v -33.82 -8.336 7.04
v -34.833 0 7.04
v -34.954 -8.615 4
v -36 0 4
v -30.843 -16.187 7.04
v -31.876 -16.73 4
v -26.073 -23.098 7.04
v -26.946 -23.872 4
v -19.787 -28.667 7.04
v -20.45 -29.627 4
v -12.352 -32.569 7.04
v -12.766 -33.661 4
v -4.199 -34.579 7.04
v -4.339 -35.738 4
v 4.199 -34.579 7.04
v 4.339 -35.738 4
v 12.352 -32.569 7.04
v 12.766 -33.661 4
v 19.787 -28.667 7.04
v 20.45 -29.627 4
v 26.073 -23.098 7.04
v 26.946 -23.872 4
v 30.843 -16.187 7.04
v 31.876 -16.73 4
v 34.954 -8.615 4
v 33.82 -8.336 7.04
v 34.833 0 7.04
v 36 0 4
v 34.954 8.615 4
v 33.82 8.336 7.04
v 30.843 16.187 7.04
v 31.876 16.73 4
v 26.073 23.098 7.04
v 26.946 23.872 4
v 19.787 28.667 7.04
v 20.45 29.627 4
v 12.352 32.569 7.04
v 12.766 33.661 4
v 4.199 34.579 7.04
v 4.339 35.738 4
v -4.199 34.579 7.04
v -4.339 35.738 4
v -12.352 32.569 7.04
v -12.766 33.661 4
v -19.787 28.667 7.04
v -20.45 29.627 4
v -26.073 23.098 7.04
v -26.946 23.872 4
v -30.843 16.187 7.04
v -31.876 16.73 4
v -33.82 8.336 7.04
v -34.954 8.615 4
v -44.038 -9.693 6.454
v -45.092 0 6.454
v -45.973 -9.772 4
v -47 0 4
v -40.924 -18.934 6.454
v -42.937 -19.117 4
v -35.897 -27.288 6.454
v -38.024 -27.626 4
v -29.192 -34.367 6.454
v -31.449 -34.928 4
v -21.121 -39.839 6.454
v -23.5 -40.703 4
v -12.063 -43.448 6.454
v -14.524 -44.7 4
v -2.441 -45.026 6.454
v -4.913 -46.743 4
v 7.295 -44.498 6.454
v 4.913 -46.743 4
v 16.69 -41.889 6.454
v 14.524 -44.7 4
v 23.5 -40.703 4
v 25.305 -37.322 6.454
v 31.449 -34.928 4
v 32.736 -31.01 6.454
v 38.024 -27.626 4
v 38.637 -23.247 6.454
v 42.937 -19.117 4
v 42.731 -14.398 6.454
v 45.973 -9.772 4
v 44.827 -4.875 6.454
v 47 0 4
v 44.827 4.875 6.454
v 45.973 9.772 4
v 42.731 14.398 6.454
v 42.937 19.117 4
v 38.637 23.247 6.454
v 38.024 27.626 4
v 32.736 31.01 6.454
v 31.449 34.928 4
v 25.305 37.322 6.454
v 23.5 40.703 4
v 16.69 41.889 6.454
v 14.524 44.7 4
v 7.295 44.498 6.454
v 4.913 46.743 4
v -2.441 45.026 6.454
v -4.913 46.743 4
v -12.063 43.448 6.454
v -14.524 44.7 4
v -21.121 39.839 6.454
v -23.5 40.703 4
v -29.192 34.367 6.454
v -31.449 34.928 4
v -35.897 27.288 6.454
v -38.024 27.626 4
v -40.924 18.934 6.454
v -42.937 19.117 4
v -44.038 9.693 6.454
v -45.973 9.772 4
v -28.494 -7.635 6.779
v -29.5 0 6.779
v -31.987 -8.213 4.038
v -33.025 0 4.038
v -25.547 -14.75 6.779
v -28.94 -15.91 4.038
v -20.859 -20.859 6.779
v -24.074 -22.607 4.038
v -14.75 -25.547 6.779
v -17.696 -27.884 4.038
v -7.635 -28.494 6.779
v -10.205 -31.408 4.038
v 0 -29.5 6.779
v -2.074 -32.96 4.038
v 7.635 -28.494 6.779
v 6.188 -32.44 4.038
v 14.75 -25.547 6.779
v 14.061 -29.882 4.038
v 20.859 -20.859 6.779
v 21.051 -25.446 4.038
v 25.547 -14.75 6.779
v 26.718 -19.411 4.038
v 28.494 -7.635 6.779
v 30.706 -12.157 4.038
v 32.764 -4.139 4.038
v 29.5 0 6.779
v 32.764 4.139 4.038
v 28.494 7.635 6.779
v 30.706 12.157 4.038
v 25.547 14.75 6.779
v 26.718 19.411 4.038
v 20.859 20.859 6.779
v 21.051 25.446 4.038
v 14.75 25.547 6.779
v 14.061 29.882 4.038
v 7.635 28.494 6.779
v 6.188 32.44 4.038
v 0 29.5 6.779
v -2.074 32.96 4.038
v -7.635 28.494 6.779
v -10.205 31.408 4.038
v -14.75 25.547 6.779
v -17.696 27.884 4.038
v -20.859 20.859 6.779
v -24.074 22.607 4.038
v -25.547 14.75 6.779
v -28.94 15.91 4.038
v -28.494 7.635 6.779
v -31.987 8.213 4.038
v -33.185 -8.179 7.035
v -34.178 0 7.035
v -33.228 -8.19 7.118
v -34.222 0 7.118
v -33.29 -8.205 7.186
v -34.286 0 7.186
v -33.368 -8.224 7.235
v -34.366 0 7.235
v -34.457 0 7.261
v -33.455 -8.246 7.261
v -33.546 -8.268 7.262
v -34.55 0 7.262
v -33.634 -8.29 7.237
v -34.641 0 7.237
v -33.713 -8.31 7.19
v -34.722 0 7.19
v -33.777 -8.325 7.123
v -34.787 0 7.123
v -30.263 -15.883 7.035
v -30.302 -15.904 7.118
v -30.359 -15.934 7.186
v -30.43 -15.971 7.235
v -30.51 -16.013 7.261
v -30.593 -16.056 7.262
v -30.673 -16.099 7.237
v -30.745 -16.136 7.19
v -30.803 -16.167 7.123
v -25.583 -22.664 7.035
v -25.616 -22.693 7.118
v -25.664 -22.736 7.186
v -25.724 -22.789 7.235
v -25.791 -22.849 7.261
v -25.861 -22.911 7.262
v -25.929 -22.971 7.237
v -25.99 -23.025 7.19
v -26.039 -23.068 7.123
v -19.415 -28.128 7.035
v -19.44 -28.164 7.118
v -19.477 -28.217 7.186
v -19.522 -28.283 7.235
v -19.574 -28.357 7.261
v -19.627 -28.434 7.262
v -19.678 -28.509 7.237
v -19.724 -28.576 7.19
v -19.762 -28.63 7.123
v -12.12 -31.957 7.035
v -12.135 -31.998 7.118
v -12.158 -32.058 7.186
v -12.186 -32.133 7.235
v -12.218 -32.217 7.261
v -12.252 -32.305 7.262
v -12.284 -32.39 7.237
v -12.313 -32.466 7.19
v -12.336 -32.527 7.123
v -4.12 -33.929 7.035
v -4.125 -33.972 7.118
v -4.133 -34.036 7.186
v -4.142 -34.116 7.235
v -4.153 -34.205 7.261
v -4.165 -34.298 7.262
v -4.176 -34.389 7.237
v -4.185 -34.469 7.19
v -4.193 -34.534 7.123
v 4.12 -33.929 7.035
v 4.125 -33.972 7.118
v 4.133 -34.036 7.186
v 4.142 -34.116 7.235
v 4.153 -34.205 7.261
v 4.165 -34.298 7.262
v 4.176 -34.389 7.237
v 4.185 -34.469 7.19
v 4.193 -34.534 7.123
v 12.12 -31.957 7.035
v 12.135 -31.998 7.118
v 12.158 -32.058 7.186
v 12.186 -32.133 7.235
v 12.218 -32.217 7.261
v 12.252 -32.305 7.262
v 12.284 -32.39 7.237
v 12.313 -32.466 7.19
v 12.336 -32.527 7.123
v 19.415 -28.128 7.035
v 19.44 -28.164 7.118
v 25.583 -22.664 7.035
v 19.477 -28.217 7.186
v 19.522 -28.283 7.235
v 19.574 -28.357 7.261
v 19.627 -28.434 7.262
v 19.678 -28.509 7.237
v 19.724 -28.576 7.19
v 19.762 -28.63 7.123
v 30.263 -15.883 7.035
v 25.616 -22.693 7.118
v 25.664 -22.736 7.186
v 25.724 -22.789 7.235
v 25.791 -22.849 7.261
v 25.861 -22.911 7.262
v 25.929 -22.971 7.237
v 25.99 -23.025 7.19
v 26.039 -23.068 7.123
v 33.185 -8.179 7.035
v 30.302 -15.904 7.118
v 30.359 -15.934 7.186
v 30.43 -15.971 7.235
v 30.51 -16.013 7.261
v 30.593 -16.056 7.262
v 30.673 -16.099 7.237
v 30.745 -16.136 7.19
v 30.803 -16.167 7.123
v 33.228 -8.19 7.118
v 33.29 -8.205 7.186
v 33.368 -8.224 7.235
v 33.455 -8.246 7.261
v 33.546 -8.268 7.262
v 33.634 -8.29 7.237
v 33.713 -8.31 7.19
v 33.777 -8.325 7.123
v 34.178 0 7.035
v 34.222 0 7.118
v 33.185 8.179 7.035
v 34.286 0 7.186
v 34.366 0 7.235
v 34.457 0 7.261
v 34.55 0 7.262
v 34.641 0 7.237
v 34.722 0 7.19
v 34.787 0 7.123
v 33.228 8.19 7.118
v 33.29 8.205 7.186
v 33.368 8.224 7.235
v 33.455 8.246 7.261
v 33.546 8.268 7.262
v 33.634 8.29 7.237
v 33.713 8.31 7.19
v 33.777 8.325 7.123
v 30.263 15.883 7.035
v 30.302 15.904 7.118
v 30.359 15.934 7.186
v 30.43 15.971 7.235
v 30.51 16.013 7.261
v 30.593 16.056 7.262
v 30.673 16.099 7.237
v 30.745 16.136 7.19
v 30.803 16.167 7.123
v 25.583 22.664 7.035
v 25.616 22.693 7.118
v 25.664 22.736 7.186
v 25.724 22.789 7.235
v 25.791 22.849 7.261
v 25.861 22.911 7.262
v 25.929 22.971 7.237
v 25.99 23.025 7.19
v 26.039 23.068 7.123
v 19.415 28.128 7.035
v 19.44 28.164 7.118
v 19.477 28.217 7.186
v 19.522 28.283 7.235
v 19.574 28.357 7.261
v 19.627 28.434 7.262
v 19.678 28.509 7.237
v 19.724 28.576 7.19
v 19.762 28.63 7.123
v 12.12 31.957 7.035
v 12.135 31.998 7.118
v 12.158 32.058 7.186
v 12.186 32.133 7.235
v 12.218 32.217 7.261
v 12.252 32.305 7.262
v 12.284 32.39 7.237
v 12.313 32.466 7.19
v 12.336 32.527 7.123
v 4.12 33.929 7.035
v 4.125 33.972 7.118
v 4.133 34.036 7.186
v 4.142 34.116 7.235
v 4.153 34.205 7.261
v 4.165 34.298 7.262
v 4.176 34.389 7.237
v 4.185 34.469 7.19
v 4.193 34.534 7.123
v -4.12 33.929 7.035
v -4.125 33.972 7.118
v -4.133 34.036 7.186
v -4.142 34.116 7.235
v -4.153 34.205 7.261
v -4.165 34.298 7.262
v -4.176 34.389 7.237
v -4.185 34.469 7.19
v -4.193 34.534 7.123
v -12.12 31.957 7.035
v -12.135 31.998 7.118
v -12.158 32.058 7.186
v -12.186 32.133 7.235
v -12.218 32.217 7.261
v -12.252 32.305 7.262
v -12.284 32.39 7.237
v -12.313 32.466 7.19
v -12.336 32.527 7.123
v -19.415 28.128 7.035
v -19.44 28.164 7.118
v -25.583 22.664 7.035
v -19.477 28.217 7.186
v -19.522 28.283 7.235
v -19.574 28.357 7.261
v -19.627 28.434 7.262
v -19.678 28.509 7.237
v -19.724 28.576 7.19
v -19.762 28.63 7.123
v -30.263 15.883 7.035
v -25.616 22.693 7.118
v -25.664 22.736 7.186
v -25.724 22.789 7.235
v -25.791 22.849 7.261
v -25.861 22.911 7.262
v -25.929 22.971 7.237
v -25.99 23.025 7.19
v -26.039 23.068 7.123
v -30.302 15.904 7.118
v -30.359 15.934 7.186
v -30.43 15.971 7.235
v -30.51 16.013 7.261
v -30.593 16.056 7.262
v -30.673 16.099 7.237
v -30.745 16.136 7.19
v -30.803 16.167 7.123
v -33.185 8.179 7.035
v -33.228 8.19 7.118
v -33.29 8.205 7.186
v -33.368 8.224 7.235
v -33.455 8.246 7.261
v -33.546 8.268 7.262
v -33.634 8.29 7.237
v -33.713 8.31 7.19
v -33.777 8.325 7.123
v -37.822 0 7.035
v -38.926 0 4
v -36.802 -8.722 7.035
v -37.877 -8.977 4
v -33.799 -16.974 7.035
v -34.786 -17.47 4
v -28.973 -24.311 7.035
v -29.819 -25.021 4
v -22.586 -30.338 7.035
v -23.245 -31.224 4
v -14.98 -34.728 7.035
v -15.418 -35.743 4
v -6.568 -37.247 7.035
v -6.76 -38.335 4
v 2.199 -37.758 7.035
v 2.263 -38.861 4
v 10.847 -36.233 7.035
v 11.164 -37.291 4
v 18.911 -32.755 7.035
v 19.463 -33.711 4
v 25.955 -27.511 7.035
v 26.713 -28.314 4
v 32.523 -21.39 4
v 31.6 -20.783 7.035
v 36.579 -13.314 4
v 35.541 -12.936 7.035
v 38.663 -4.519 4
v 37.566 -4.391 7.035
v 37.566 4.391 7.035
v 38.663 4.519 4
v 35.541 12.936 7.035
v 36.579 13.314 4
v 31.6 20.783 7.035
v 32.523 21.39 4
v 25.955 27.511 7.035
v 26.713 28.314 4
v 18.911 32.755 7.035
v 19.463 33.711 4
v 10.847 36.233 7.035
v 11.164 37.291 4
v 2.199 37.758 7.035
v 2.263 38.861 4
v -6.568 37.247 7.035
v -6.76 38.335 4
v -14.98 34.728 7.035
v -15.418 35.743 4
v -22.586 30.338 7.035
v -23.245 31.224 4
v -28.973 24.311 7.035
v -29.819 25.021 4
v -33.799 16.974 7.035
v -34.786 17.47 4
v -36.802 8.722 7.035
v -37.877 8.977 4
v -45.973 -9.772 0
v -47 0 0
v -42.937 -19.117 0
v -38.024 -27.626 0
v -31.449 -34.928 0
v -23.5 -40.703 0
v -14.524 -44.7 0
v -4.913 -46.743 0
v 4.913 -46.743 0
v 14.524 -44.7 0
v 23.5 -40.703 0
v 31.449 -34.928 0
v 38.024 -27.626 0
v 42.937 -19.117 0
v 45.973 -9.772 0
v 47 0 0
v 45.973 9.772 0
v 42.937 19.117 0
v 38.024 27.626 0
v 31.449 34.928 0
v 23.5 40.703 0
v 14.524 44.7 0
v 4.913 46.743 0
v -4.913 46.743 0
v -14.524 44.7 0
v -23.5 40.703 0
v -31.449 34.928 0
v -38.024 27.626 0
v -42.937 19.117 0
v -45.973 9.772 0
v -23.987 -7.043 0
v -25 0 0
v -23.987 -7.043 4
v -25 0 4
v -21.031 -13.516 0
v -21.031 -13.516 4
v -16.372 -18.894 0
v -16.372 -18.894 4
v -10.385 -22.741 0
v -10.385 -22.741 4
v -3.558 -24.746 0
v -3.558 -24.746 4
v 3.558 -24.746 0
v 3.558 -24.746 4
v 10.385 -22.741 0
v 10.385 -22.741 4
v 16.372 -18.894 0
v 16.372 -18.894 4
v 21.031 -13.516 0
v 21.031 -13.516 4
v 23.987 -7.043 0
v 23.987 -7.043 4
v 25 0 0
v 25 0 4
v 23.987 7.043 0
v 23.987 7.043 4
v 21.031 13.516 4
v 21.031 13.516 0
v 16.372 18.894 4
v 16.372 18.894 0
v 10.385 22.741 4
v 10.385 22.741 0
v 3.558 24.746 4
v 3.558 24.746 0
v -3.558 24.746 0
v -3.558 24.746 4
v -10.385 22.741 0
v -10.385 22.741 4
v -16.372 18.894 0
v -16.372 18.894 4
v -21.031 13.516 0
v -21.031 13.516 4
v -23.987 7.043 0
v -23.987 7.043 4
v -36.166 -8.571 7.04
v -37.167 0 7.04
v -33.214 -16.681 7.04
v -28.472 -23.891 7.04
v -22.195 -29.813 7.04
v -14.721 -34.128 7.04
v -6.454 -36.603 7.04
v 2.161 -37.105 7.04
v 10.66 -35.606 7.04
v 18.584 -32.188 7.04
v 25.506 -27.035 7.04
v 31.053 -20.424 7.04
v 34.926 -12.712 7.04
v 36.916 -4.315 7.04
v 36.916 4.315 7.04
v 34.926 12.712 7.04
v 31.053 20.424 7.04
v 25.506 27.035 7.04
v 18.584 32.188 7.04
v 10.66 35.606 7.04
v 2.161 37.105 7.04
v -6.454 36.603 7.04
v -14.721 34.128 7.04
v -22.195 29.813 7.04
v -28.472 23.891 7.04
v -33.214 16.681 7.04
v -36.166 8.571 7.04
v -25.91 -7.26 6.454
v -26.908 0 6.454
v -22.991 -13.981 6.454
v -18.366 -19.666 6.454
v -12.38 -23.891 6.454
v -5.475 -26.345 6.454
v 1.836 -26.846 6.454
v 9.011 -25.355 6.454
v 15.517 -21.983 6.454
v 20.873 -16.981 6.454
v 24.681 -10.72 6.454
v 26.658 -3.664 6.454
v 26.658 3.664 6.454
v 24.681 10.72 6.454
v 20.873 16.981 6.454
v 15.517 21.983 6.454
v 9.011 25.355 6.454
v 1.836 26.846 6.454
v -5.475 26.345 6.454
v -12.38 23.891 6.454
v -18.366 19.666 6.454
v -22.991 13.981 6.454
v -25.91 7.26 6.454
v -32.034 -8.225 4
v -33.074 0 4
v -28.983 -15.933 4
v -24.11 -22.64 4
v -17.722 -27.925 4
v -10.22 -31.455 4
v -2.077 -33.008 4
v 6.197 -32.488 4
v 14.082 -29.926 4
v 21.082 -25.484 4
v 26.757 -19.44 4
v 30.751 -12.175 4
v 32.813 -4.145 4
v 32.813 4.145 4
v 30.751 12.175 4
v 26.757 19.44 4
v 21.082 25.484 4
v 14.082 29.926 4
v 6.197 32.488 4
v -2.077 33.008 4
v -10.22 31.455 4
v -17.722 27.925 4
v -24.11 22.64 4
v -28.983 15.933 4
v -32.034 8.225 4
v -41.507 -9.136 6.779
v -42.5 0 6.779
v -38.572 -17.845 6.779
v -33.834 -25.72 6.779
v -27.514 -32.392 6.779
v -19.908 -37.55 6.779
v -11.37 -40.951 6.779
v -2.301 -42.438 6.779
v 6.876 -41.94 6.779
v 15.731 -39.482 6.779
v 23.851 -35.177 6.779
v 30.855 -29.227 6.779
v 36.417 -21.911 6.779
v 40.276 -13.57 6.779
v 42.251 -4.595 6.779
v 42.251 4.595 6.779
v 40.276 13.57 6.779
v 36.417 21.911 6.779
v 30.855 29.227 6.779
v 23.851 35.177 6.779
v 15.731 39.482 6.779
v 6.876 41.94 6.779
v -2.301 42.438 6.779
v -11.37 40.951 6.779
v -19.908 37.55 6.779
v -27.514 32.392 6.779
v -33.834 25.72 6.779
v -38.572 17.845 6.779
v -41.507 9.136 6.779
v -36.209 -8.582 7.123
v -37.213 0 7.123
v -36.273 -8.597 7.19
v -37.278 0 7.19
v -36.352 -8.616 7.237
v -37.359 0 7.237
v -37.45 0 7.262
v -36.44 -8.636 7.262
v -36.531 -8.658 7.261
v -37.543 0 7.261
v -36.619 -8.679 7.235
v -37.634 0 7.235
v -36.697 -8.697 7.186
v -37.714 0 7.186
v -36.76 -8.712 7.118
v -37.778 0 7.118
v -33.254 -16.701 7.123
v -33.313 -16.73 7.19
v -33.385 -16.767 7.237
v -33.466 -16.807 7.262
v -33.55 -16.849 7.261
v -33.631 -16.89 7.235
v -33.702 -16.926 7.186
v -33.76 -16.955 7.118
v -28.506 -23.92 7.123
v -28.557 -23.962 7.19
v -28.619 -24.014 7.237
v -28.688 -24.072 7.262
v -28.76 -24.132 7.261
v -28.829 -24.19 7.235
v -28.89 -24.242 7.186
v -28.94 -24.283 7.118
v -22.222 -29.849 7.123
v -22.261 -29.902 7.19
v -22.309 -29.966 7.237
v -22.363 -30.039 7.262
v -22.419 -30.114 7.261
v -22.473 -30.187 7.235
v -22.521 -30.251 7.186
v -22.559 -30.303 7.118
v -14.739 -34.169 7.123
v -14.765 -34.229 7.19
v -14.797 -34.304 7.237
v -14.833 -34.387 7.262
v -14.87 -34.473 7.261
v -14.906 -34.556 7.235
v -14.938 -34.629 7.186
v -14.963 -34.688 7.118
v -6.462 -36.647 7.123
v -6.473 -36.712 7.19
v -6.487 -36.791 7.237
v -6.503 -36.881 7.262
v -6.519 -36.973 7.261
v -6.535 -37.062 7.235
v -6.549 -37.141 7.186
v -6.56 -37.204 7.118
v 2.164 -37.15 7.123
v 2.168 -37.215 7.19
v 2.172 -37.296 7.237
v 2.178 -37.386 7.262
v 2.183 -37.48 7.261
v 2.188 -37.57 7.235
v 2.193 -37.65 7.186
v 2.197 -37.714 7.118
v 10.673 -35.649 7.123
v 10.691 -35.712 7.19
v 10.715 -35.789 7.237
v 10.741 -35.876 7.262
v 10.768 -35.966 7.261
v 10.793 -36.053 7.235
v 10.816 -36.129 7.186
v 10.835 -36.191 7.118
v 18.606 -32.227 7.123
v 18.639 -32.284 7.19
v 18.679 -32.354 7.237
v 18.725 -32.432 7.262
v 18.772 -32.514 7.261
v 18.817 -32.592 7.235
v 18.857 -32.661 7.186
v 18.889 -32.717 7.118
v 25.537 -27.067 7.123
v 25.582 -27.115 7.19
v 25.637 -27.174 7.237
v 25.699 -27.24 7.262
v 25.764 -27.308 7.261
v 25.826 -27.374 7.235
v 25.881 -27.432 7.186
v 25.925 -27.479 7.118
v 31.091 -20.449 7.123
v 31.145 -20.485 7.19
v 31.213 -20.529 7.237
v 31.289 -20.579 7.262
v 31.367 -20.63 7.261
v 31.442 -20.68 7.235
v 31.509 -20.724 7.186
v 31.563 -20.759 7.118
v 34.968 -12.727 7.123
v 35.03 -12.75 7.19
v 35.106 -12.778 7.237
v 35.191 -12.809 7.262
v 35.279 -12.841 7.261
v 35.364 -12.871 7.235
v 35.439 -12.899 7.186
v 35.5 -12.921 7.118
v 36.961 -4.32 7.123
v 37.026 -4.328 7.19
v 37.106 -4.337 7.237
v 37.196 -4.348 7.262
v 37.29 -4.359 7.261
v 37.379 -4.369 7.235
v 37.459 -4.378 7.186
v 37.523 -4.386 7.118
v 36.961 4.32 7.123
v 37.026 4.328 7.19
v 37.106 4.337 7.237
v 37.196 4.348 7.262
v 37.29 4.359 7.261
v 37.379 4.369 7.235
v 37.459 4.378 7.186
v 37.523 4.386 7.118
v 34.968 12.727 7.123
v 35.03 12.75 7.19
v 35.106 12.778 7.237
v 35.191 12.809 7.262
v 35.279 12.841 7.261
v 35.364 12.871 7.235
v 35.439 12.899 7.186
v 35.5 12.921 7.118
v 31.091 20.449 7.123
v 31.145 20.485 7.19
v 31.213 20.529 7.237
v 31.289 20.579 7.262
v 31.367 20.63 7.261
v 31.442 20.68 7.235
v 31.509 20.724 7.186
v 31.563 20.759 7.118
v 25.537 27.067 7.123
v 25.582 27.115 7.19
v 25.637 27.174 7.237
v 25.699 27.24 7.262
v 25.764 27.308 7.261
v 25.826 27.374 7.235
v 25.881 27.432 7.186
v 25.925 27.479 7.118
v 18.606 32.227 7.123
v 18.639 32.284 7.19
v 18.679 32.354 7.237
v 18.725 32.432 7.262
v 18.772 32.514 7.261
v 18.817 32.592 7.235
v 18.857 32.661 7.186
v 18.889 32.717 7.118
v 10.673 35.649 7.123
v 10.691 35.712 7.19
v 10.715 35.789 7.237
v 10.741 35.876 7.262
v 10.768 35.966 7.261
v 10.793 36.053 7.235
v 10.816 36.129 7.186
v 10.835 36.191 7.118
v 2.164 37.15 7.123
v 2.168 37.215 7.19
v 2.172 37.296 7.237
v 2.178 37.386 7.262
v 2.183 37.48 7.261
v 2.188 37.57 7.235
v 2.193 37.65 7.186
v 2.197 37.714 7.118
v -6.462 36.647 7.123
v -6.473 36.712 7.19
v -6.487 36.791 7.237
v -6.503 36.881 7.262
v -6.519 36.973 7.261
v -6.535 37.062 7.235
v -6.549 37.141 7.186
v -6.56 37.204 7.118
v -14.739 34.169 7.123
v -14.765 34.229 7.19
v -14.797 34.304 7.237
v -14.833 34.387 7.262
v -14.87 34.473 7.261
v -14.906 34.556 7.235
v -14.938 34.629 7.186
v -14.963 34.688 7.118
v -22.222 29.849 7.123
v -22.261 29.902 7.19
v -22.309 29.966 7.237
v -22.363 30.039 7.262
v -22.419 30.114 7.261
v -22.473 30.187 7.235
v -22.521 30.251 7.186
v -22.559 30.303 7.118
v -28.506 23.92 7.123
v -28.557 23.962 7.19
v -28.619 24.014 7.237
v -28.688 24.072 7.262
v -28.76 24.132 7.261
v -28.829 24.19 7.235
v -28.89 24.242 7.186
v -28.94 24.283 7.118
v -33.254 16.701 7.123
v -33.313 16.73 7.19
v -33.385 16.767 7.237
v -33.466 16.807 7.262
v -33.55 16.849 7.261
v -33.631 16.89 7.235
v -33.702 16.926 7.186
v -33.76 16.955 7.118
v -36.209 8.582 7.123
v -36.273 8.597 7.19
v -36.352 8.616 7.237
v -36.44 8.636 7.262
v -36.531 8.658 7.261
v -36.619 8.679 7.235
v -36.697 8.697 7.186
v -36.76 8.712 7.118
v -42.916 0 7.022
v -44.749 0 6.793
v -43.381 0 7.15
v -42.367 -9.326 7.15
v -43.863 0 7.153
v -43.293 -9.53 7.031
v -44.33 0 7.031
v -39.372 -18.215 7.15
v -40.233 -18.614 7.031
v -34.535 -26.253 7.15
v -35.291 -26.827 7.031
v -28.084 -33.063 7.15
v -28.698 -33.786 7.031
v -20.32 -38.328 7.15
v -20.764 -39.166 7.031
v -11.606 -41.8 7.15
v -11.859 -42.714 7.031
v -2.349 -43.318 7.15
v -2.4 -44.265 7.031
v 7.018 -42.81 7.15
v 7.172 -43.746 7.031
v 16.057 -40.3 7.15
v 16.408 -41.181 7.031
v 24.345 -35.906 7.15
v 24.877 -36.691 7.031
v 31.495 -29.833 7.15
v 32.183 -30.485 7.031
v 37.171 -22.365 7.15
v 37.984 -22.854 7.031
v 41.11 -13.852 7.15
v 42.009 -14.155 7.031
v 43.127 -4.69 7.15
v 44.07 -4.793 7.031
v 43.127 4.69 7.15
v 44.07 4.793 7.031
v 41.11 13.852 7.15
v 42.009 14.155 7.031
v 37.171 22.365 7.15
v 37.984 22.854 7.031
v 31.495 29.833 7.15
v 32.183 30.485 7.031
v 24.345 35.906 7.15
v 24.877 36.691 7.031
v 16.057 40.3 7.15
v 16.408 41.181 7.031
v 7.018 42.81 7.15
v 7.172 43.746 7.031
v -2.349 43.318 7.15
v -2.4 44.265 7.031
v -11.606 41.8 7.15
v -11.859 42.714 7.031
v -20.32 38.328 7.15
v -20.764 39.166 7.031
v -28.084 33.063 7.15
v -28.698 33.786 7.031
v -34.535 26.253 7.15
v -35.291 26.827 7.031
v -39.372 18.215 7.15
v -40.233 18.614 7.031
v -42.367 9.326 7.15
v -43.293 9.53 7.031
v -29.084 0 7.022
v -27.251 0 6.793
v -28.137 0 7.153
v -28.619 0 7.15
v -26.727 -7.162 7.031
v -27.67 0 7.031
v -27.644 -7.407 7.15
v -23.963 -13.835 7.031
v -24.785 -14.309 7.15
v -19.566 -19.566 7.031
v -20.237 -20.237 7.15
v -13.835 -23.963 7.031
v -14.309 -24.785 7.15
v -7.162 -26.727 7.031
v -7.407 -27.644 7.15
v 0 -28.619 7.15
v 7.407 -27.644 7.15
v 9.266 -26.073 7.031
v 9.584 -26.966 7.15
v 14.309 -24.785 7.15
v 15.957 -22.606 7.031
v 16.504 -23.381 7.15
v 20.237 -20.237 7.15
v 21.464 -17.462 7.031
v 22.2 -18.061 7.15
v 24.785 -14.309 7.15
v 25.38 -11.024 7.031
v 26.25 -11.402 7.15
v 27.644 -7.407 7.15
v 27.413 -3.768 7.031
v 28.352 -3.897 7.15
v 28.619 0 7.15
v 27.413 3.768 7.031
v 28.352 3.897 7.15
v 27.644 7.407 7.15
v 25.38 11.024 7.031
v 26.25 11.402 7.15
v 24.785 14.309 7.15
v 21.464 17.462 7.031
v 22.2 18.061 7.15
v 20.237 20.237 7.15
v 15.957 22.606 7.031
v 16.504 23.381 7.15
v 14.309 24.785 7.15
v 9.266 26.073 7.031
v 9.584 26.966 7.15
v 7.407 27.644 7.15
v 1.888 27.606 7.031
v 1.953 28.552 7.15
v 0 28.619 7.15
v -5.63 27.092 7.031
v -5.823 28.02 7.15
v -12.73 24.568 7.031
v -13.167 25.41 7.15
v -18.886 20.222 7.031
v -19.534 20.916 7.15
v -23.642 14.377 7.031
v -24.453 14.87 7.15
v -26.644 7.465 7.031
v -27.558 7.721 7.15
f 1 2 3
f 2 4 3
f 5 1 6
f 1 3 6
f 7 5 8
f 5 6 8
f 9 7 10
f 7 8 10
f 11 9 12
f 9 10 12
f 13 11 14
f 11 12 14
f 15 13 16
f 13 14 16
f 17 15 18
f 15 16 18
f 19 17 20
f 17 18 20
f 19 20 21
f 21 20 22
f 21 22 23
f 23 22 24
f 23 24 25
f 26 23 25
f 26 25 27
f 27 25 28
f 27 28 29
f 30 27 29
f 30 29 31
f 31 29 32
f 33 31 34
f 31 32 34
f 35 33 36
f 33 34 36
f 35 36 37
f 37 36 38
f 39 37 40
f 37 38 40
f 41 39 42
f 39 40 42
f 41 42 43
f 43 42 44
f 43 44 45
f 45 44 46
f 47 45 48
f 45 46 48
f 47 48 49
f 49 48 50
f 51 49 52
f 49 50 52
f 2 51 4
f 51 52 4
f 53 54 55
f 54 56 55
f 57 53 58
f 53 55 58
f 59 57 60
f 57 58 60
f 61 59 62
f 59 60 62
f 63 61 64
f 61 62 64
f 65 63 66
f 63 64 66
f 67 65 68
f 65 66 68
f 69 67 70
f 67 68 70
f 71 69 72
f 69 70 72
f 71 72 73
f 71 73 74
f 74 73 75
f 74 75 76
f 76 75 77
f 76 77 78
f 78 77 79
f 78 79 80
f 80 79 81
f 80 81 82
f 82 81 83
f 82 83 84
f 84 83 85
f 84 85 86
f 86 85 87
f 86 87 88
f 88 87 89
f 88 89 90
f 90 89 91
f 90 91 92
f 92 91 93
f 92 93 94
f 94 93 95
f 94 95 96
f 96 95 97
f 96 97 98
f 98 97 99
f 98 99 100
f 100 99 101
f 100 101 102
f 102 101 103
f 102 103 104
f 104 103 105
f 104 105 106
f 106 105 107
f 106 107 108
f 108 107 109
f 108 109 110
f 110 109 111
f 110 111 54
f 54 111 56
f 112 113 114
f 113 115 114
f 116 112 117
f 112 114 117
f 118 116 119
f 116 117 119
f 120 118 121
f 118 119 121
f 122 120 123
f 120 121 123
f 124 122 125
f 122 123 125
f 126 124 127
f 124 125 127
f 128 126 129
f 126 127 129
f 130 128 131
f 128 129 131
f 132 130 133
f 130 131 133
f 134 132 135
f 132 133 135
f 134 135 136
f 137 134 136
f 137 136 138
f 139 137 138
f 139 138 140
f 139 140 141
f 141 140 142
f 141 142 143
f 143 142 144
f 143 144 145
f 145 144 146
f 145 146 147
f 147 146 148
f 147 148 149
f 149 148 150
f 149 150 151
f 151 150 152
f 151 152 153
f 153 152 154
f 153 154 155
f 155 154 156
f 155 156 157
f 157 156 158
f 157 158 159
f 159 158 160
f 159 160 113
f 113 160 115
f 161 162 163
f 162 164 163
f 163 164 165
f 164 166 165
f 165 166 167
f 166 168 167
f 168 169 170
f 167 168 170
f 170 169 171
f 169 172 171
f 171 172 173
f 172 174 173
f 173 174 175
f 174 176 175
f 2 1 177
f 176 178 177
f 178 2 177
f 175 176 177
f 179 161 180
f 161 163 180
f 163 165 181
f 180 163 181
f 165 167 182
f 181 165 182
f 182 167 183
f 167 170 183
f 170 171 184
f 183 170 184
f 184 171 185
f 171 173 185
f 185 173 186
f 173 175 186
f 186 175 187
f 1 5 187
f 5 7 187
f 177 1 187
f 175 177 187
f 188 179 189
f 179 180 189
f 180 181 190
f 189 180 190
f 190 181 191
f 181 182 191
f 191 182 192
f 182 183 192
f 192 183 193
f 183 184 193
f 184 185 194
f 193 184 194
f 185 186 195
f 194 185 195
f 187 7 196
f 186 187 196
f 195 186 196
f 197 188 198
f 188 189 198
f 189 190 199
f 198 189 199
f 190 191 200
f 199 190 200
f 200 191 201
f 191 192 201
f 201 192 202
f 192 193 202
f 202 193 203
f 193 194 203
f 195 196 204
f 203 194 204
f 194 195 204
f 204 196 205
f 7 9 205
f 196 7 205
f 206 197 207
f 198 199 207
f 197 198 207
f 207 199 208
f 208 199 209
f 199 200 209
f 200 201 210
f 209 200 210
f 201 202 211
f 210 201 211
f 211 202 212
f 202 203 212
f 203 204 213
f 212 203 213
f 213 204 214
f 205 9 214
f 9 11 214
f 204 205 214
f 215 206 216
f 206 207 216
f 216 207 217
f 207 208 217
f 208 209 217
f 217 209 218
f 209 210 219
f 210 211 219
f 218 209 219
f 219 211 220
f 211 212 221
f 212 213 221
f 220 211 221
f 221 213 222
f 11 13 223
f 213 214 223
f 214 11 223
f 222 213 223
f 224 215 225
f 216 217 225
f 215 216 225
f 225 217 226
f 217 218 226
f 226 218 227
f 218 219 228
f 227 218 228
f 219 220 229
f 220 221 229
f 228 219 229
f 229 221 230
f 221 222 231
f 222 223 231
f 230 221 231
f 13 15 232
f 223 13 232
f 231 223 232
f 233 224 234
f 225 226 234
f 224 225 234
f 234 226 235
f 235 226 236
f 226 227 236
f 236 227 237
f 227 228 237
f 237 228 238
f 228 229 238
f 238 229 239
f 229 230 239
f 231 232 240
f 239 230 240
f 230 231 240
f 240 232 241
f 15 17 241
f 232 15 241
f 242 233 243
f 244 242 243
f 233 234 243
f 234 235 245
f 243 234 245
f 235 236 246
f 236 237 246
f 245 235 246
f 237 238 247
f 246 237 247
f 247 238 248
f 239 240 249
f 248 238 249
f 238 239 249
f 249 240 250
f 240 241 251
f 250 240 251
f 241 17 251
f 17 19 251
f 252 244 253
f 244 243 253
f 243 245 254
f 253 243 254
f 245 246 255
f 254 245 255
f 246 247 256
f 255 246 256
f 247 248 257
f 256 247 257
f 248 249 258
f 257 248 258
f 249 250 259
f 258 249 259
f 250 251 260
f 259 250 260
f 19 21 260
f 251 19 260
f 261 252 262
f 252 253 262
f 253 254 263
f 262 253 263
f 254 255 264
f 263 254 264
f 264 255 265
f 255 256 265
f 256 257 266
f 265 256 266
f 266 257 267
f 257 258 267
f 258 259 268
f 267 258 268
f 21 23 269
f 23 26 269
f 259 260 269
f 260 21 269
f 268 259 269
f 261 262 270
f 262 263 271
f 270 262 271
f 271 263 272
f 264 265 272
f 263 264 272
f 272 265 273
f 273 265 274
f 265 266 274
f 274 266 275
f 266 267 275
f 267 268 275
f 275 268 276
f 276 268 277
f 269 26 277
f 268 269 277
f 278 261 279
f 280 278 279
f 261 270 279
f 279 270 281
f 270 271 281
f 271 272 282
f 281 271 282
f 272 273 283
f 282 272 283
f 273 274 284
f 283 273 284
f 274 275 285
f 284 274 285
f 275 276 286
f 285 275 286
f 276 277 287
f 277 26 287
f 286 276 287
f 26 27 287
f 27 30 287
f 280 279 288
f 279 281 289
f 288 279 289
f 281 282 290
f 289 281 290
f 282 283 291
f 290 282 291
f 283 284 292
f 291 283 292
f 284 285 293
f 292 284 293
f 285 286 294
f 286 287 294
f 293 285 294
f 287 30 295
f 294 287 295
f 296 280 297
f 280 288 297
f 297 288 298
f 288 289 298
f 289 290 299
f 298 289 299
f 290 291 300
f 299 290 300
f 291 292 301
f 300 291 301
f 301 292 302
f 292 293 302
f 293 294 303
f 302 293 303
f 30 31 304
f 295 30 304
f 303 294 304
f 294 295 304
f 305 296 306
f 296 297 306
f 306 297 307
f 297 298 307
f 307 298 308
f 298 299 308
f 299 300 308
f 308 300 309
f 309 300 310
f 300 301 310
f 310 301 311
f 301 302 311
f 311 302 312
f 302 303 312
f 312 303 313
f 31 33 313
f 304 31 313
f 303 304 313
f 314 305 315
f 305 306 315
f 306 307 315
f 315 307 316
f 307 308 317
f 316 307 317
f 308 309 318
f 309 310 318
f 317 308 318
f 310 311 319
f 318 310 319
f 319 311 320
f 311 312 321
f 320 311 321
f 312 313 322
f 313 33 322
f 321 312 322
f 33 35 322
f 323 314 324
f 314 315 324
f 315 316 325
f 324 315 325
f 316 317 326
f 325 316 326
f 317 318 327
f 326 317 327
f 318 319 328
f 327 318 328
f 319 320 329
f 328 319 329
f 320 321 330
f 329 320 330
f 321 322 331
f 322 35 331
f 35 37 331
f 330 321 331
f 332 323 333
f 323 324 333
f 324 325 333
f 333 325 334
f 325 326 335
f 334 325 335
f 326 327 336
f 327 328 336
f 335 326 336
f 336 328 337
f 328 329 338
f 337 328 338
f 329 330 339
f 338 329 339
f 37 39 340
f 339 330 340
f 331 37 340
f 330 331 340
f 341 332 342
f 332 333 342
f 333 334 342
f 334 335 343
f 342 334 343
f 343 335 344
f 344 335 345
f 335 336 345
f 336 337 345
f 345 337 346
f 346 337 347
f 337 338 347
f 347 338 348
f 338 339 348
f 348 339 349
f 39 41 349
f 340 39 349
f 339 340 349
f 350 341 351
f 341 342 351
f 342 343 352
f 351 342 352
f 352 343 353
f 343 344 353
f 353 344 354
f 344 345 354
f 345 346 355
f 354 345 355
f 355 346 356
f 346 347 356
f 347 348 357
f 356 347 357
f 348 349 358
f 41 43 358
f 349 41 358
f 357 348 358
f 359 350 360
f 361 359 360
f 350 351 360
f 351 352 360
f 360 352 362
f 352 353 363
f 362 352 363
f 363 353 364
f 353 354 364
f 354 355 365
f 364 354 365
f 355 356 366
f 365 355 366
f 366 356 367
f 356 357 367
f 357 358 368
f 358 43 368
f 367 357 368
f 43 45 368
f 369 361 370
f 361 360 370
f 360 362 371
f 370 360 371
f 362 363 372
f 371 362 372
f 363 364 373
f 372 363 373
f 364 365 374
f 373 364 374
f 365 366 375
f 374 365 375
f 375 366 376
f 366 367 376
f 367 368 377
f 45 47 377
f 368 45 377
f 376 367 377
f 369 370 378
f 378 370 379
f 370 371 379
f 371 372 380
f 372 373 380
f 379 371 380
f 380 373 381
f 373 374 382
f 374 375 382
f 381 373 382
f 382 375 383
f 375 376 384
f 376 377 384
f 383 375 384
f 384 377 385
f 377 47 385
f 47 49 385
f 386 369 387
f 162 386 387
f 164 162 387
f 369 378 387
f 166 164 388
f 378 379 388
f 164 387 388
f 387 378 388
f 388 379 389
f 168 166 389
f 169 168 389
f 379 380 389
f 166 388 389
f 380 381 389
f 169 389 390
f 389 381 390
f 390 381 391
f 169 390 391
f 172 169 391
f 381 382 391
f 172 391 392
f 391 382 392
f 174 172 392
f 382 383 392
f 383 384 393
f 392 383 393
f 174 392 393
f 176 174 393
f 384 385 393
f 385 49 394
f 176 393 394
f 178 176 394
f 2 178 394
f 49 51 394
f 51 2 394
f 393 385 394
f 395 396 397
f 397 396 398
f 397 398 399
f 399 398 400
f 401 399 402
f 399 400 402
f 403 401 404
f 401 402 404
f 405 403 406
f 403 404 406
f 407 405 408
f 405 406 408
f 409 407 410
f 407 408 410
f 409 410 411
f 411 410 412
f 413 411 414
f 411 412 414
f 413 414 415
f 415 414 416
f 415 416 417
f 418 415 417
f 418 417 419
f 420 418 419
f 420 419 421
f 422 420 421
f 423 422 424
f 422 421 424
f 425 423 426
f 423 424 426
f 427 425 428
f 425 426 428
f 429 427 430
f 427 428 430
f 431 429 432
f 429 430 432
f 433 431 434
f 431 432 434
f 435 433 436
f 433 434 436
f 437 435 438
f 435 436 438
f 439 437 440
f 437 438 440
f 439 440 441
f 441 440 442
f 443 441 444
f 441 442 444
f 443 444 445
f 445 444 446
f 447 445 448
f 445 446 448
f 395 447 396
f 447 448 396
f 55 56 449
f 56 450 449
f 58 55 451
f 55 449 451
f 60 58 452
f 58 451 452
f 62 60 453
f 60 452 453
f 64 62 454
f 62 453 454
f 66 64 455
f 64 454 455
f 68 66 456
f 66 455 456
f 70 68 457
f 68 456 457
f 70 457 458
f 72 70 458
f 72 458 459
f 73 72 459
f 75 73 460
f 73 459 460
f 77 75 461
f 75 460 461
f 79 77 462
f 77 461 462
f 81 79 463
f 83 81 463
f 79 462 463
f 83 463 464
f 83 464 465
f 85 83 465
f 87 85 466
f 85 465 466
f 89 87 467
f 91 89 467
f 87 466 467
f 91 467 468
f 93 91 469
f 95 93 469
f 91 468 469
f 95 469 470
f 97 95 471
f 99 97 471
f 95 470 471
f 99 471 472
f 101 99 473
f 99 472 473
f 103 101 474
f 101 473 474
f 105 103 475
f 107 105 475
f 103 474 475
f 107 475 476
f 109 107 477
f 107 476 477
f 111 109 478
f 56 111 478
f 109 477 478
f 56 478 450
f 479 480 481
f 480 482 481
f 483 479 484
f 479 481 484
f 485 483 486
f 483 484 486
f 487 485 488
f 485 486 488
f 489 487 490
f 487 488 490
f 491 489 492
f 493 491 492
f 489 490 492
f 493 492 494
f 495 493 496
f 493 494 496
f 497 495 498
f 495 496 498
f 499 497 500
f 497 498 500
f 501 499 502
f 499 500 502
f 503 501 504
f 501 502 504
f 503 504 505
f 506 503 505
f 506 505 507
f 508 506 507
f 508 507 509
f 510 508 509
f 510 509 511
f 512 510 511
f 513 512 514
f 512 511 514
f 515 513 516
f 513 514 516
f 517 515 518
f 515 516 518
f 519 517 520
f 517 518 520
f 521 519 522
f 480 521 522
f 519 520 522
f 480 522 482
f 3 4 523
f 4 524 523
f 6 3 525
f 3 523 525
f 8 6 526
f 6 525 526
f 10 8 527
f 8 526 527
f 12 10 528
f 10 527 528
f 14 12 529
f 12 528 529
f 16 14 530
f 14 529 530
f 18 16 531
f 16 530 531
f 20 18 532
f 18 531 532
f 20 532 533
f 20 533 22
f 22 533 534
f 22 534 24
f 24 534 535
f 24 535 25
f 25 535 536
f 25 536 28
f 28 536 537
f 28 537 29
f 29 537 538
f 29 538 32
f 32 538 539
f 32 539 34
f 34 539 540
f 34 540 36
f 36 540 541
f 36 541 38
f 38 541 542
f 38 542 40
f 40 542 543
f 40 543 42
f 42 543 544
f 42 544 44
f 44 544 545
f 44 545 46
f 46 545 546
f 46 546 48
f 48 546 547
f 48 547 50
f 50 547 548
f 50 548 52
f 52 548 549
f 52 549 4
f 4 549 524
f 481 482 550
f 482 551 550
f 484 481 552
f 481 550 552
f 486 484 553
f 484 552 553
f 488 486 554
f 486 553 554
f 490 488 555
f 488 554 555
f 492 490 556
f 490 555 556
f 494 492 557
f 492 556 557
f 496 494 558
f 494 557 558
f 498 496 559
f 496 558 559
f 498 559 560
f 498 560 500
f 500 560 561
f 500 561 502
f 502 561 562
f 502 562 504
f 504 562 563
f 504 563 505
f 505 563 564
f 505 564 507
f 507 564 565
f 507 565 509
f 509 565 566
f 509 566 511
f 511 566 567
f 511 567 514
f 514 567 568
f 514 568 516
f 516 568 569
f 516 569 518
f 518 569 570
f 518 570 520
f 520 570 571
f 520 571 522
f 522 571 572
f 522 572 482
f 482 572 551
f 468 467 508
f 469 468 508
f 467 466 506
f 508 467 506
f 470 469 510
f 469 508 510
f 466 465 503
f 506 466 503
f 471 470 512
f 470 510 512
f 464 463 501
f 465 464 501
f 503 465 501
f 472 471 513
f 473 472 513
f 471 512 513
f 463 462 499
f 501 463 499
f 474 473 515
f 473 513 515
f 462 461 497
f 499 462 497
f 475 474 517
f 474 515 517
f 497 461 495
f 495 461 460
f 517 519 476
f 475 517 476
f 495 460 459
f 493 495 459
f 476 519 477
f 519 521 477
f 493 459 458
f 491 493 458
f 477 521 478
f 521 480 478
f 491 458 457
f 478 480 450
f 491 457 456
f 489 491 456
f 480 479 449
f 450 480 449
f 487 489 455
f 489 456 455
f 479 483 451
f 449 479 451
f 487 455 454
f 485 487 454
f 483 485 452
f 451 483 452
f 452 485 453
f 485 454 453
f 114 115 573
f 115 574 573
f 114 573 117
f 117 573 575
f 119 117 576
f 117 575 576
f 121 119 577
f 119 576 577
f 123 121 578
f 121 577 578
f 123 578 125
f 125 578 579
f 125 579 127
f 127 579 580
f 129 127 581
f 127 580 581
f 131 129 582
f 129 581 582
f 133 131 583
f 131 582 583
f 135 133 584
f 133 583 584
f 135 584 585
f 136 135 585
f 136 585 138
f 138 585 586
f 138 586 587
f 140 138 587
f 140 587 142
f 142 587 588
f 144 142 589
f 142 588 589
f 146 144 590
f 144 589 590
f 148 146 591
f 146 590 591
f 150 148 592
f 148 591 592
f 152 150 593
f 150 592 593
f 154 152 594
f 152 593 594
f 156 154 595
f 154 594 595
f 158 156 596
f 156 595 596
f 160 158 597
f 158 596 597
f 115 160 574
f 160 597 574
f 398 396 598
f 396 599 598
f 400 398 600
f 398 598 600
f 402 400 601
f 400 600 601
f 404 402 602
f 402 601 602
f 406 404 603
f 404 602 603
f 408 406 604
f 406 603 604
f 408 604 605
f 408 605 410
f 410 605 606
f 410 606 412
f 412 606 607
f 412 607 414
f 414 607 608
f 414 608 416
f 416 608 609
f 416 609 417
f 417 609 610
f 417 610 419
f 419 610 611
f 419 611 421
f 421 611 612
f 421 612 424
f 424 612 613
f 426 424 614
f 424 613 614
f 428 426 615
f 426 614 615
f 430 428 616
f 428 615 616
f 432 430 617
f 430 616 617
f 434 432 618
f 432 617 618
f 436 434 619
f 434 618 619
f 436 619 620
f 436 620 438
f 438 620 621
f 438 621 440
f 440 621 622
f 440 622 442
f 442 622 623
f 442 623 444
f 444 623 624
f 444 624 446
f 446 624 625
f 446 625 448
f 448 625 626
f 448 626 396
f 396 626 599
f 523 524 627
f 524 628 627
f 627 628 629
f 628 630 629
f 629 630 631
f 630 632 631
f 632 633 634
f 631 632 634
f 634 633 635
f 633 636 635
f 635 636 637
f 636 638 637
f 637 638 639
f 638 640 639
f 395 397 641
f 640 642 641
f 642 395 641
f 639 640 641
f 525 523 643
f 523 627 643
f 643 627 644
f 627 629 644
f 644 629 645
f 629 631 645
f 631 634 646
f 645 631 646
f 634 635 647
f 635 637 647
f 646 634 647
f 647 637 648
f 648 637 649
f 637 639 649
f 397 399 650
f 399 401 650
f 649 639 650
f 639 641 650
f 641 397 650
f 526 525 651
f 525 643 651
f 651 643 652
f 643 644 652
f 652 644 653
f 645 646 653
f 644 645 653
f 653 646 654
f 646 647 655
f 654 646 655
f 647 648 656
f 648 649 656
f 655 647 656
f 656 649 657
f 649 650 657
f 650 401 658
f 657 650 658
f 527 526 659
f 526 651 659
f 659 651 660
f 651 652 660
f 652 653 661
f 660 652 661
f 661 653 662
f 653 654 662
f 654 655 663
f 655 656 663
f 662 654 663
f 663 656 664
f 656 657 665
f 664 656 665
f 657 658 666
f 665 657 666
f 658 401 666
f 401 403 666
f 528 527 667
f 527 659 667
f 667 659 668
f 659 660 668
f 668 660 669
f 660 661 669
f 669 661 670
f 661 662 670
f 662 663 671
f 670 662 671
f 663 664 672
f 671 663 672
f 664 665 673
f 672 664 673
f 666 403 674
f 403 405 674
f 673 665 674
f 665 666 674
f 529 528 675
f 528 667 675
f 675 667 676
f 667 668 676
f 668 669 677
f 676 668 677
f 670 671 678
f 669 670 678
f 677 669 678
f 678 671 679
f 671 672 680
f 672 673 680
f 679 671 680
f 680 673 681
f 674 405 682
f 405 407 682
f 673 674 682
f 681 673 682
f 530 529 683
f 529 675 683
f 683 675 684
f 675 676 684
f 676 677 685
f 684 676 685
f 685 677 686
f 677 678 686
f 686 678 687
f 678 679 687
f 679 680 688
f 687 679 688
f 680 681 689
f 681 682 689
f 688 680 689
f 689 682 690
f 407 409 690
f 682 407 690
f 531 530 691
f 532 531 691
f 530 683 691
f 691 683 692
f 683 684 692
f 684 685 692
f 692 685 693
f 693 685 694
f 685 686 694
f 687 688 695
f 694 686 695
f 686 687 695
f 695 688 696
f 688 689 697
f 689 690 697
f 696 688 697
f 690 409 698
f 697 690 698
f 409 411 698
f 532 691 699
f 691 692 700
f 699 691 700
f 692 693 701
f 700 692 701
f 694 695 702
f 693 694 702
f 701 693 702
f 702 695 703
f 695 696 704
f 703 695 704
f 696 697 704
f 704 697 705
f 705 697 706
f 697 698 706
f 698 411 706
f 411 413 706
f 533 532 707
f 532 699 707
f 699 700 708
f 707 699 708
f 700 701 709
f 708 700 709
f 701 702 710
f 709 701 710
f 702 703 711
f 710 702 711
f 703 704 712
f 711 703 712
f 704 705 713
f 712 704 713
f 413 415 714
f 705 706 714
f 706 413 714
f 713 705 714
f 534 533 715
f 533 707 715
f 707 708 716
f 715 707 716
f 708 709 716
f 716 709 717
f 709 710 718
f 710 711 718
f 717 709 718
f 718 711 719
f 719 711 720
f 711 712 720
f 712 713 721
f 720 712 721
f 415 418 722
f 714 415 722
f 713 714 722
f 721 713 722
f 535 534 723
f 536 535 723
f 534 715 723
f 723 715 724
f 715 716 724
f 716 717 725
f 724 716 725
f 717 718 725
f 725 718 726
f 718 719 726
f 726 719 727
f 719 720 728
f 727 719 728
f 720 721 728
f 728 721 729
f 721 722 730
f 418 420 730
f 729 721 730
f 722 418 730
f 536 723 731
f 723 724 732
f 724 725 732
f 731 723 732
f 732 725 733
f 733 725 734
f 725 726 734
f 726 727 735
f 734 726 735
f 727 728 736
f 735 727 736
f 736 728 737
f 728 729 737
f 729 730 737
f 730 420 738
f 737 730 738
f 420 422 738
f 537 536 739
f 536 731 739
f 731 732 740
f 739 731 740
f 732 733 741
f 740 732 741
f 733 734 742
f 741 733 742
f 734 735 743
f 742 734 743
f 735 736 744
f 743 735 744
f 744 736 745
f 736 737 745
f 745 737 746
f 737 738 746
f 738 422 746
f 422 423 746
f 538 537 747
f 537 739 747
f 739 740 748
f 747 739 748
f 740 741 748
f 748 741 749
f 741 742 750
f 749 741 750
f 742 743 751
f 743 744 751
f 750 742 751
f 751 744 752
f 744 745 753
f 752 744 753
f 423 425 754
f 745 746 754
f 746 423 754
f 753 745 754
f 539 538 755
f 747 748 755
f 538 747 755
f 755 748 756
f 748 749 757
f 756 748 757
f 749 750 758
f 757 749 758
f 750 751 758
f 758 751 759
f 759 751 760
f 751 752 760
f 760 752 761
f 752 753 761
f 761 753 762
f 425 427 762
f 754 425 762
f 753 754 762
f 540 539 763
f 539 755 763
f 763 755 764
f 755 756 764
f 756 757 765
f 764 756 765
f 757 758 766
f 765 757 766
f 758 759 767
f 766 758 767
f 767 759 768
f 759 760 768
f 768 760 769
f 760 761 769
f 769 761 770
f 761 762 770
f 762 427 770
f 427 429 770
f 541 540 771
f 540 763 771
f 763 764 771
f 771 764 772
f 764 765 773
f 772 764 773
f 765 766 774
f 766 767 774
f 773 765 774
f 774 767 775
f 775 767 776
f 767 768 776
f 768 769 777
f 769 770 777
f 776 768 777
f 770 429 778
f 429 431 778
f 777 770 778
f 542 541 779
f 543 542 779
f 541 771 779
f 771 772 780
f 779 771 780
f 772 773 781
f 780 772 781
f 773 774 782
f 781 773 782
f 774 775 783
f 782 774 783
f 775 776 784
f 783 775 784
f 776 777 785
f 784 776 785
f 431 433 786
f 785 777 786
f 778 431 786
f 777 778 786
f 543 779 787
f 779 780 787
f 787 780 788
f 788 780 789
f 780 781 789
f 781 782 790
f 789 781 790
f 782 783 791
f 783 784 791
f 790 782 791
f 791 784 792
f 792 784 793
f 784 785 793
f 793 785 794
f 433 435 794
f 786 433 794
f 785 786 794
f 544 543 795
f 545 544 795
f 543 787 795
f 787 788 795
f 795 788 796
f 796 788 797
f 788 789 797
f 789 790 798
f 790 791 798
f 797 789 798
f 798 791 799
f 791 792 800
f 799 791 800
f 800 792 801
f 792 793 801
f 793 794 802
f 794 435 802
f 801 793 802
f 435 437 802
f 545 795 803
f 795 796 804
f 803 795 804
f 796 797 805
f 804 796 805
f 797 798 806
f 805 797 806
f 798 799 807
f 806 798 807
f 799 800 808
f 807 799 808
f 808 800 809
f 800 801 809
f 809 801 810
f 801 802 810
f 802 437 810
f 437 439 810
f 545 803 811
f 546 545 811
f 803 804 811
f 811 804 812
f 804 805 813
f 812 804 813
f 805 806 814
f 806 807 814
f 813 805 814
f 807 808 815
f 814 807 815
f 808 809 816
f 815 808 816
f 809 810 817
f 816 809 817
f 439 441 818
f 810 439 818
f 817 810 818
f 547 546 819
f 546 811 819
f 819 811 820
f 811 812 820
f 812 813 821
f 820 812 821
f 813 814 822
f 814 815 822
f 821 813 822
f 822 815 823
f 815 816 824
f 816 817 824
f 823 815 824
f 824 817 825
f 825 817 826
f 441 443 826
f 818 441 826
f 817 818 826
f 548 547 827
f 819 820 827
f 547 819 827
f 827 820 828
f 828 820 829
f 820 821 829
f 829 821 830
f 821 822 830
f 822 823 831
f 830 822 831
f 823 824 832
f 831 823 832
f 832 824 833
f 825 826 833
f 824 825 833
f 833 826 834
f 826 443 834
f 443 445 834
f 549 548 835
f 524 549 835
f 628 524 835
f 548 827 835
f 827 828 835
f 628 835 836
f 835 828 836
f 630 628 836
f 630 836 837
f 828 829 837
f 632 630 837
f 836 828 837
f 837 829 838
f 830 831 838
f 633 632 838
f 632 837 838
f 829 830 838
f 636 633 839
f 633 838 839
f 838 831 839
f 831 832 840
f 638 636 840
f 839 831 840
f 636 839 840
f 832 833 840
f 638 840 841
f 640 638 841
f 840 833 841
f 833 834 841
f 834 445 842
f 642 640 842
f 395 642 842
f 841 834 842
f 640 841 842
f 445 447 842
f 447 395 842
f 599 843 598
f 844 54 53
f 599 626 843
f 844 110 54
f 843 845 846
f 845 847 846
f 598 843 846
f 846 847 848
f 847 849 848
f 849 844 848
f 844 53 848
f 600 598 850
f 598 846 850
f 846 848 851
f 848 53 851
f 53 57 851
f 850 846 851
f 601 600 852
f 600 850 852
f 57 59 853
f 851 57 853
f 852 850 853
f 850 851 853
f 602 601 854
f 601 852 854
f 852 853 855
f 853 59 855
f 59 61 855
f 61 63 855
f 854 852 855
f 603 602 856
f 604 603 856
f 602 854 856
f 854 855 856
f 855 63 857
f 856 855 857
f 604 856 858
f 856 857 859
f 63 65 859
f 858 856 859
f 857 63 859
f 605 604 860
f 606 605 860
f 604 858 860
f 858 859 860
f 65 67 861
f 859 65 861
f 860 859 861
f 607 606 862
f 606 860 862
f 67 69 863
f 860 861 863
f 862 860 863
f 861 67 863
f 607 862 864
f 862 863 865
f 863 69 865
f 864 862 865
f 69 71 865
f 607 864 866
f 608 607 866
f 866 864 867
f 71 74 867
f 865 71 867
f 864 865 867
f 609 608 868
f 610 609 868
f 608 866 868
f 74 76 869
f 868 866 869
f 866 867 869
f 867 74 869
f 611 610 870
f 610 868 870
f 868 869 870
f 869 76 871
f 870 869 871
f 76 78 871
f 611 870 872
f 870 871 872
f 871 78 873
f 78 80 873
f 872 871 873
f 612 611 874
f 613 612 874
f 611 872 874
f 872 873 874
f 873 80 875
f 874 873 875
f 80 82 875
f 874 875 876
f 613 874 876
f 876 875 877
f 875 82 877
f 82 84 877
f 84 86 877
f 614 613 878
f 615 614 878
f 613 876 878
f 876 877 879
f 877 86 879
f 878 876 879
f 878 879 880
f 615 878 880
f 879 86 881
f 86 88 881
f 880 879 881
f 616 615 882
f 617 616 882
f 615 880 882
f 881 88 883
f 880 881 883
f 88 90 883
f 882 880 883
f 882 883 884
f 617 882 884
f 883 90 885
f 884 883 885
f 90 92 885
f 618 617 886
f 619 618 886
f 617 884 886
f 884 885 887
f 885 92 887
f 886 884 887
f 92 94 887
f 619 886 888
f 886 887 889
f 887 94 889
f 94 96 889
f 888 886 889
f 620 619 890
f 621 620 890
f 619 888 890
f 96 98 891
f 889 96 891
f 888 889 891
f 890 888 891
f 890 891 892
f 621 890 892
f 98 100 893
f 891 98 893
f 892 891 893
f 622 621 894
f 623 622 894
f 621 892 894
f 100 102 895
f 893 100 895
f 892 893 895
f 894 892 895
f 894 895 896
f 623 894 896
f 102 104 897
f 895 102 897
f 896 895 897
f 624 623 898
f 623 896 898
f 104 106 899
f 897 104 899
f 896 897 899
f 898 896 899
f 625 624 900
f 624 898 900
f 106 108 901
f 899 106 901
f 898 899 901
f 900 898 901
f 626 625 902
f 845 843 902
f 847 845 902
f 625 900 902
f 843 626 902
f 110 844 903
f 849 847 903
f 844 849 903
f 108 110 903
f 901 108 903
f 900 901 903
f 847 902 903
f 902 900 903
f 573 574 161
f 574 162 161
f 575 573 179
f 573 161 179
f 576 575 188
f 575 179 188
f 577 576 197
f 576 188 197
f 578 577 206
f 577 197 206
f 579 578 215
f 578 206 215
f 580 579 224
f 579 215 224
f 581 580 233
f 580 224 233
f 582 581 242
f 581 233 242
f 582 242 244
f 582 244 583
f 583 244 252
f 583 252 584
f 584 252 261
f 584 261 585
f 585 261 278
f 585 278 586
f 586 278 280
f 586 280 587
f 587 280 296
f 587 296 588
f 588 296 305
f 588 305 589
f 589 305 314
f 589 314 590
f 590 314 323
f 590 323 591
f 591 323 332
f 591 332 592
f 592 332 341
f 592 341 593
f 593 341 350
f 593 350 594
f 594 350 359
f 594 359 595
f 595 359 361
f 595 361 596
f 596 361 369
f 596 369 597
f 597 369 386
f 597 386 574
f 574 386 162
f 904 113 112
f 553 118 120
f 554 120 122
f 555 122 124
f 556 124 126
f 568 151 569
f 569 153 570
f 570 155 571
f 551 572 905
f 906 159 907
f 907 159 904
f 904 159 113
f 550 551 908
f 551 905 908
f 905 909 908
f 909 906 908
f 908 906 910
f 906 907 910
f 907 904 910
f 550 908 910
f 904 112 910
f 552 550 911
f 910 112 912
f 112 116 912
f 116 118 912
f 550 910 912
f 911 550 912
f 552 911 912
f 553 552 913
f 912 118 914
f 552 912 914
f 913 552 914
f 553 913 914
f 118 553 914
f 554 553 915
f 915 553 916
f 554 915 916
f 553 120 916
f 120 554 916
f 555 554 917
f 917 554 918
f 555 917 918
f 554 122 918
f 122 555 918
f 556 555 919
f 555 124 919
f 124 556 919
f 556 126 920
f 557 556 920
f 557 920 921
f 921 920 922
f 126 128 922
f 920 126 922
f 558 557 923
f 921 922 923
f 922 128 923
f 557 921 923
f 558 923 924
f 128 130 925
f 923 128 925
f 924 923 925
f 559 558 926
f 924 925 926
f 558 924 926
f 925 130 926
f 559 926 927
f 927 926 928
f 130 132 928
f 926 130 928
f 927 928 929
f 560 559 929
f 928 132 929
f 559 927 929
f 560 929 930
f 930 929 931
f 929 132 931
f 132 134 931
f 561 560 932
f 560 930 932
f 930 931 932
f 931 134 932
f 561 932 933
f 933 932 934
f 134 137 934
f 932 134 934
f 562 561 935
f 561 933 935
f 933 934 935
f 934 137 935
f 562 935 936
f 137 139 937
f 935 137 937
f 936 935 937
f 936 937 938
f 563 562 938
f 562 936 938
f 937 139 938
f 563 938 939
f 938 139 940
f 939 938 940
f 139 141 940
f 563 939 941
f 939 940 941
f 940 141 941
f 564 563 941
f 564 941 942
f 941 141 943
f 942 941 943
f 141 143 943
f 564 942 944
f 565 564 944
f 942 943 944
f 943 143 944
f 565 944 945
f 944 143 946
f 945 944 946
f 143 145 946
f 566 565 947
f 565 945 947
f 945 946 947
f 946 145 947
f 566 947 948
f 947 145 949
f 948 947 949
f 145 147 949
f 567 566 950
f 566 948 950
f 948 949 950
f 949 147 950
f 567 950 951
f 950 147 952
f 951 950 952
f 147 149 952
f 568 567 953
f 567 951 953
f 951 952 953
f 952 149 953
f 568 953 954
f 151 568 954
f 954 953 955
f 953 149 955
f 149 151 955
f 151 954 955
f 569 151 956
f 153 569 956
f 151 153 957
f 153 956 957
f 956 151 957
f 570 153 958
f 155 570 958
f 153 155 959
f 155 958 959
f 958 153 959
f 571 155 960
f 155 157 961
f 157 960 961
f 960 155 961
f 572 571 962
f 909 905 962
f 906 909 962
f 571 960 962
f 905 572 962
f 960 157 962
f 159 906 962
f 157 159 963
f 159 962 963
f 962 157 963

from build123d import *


with BuildPart() as f1:
    # F0 (on Front) → F1 (revolve)
    with BuildSketch(Plane.XZ):
        with BuildLine():
            Line((-47, 0), (-25, 0))
            Line((-25, 0), (-25, 3.982928))
            Line((-25, 3.982928), (-25.021957, 4))
            Line((-25.021957, 4), (-25, 4))
            Line((-25, 4), (-26.90827, 6.454344))
            ThreePointArc((-26.90827, 6.454344), (-28.136784, 7.153221), (-29.499656, 6.778711))
            Line((-29.499656, 6.778711), (-33.024692, 4.037971))
            Line((-33.024692, 4.037971), (-33.054214, 4))
            Line((-33.054214, 4), (-33.073528, 4))
            Line((-33.073528, 4), (-34.178294, 7.034632))
            ThreePointArc((-34.178294, 7.034632), (-34.503445, 7.264412), (-34.832563, 7.040351))
            Line((-34.832563, 7.040351), (-36, 4))
            Line((-36, 4), (-37.167437, 7.040351))
            ThreePointArc((-37.167437, 7.040351), (-37.496555, 7.264412), (-37.821706, 7.034632))
            Line((-37.821706, 7.034632), (-38.926472, 4))
            Line((-38.926472, 4), (-42.500344, 6.778711))
            ThreePointArc((-42.500344, 6.778711), (-43.863216, 7.153221), (-45.09173, 6.454344))
            Line((-45.09173, 6.454344), (-47, 4))
            Line((-47, 4), (-47, 0))
        make_face()
        Polygon((-25.021957, 4), (-25, 3.982928), (-25, 4), align=None)
        Polygon((-33.054214, 4), (-33.024692, 4.037971), (-33.073528, 4), align=None)
    revolve(axis=Axis((0, 0, 2), (0, 0, 1)))


solid = f1.part
